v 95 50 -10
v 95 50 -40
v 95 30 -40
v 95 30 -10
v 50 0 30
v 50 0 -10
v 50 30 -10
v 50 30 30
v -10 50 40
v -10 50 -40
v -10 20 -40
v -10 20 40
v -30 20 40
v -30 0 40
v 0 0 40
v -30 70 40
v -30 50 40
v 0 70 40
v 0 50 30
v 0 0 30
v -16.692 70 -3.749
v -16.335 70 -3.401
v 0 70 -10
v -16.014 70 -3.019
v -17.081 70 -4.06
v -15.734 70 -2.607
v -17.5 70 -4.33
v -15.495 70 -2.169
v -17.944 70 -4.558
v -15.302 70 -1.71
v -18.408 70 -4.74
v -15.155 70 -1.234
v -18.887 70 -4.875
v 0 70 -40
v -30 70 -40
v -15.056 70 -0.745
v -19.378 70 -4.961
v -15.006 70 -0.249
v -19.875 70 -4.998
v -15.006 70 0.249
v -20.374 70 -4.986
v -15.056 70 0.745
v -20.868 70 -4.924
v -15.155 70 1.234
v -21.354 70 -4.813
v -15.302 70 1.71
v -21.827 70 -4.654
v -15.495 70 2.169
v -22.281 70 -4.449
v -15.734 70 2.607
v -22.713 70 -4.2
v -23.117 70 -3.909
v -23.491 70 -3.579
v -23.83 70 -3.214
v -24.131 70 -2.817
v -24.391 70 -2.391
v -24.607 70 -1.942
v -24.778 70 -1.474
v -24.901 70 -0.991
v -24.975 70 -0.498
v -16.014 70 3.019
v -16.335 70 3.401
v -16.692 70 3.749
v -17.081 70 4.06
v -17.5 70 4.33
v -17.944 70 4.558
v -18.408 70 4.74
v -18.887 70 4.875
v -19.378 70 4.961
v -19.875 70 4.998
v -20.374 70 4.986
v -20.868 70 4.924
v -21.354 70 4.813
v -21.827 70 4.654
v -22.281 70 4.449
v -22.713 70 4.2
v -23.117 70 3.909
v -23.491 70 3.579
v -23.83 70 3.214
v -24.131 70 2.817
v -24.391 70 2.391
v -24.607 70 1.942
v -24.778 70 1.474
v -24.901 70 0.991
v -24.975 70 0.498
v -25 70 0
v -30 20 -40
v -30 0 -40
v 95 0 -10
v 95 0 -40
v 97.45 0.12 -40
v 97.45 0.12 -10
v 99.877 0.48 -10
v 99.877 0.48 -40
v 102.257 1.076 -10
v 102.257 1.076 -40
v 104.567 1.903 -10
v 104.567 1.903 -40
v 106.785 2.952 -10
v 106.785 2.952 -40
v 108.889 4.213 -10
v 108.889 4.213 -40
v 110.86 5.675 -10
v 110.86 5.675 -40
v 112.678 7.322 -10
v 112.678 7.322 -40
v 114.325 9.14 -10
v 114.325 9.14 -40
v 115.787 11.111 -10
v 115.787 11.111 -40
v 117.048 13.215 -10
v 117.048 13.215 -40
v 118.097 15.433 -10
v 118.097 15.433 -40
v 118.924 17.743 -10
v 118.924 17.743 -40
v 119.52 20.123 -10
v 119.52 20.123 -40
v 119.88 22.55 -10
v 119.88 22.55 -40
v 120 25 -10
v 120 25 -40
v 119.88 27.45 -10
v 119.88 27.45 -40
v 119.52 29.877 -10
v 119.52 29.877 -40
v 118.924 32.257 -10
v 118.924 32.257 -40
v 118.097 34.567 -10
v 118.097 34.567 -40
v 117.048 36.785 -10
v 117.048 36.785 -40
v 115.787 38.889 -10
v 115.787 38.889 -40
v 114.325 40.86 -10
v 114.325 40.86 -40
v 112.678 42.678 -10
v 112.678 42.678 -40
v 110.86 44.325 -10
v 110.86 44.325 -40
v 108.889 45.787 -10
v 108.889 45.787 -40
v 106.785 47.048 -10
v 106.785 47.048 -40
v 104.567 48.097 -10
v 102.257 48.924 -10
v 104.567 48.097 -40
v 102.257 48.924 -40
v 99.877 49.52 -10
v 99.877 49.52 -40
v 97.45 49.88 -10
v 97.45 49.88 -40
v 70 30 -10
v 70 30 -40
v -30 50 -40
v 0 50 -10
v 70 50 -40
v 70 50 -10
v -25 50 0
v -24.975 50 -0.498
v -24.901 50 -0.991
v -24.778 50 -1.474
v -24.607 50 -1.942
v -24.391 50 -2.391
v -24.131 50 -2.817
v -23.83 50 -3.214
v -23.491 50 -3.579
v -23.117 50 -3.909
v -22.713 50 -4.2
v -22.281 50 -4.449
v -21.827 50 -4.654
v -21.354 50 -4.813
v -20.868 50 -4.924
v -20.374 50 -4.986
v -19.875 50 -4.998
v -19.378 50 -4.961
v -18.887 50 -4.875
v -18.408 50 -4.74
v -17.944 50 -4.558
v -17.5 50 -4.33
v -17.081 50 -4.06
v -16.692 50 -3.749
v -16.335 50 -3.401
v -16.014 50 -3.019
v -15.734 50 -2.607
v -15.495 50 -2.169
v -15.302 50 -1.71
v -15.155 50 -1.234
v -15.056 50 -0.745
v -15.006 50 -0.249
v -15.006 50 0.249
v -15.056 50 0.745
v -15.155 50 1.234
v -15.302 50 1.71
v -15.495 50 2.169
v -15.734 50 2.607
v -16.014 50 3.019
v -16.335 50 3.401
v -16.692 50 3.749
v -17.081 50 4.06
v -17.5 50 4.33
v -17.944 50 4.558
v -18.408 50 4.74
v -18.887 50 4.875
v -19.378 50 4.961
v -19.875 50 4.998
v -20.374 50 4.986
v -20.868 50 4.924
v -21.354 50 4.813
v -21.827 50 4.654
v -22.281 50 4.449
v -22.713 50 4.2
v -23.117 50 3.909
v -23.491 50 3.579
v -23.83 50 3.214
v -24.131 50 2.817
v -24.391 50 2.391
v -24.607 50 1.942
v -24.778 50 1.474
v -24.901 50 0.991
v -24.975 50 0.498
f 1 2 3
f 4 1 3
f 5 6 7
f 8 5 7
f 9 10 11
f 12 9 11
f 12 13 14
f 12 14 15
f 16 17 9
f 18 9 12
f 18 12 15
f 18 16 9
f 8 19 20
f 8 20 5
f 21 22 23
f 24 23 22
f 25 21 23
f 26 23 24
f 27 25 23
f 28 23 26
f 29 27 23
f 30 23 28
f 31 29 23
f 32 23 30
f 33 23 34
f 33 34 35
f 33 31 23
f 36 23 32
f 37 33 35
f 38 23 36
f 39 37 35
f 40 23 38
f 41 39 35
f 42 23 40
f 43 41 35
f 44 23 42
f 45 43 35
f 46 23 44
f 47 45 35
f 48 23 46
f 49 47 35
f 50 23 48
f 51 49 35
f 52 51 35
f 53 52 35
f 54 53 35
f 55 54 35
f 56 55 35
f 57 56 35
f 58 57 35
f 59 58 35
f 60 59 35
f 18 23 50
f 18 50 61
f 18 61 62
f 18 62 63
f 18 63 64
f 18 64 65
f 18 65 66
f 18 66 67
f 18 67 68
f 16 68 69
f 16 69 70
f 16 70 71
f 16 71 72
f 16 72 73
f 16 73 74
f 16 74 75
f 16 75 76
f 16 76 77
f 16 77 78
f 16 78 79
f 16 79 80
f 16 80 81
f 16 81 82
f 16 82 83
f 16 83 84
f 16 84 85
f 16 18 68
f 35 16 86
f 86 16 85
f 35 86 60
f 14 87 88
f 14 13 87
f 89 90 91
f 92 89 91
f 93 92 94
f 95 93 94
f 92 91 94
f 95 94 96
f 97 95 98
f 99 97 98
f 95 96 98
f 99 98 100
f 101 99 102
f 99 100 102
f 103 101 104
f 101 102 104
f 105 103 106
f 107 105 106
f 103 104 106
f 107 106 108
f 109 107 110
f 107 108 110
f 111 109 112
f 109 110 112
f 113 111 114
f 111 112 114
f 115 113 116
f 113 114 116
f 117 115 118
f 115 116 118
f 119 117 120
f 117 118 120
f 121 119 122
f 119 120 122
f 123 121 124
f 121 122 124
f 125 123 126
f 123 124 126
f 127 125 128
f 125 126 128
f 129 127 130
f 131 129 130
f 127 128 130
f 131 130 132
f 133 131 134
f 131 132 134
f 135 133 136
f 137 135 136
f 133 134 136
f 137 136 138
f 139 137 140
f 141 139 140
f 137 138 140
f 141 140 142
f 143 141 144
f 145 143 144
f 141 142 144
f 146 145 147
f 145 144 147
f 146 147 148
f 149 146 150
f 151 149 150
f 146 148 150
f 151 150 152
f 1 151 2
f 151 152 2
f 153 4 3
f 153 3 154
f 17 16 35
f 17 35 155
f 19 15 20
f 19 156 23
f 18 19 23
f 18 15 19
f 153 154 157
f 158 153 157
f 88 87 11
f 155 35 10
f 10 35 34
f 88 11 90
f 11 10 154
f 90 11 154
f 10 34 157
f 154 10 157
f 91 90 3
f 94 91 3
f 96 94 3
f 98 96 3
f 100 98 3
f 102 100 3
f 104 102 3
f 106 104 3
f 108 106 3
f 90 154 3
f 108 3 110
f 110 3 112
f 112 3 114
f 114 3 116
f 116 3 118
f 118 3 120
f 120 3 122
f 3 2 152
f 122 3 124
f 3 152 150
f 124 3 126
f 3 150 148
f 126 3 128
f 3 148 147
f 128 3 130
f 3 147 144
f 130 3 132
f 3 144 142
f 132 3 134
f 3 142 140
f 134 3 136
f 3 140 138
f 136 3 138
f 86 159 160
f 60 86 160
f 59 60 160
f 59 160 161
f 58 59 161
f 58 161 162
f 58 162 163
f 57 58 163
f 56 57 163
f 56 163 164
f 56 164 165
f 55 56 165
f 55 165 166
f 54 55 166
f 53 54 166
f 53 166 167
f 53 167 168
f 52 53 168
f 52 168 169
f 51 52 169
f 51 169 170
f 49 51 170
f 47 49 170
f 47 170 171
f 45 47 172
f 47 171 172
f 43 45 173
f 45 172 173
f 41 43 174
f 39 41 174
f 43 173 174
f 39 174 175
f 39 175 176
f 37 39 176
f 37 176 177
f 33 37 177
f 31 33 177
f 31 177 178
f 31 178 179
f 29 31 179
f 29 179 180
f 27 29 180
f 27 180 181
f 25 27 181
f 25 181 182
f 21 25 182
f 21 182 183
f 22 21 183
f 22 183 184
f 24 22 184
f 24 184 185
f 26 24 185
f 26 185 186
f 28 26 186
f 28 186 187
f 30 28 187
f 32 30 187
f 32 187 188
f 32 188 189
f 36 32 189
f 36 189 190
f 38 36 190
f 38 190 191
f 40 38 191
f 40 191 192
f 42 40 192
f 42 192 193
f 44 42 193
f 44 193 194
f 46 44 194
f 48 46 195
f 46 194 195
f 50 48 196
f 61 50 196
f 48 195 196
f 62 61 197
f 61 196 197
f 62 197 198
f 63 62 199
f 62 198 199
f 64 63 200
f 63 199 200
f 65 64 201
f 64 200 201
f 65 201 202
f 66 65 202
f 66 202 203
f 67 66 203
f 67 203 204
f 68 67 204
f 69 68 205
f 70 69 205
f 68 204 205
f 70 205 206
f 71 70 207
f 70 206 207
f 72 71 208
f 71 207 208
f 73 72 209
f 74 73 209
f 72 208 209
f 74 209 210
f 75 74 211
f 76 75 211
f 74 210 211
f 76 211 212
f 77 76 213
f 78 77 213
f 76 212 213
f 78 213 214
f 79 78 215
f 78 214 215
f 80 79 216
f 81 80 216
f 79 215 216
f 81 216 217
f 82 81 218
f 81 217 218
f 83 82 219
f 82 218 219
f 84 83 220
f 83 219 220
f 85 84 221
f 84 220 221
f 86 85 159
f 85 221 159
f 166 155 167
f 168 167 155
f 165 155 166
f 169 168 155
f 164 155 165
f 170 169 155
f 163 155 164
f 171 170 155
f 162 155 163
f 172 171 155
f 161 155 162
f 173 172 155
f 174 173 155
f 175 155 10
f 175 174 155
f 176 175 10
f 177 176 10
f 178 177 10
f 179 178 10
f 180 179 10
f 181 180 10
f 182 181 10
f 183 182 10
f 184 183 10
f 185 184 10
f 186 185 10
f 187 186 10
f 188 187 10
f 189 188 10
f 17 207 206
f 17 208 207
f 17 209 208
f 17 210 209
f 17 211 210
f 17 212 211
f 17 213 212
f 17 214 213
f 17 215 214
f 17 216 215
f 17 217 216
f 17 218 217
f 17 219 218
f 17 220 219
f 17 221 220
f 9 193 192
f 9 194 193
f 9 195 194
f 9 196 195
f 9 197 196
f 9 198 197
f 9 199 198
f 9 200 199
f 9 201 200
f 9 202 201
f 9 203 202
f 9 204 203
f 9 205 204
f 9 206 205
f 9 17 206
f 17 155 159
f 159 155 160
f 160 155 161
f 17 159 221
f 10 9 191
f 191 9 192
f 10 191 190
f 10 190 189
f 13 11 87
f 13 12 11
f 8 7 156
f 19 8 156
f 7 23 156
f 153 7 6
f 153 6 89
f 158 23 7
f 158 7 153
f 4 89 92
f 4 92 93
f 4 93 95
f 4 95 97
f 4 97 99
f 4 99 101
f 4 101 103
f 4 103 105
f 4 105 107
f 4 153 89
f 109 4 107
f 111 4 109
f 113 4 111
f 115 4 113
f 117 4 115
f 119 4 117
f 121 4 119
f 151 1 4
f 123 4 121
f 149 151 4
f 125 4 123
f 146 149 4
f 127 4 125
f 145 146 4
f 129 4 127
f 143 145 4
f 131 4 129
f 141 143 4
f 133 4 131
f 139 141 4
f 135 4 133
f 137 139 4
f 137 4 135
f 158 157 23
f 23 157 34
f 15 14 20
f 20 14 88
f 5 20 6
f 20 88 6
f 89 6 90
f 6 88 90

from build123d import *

# Parameters (mm, degrees)
BOSS_EXTRUDE1_DEPTH        = 40
BOSS_EXTRUDE2_START        = -40
BOSS_EXTRUDE2_DEPTH        = 30
BOSS_EXTRUDE3_DEPTH        = 40
F_10_0MM_DOWEL_HOLE1_D     = 10
F_10_0MM_DOWEL_HOLE1_DEPTH = 20


with BuildPart() as part:
    # Sketch1 → Boss-Extrude1 (new, symmetric)
    with BuildSketch(Plane.XY):
        Polygon((0, 0), (0, 70), (-30, 70), (-30, 50), (-10, 50), (-10, 20), (-30, 20), (-30, 0), align=None)
    extrude(amount=BOSS_EXTRUDE1_DEPTH, both=True)

    # Sketch1<3> → Boss-Extrude2 (add)
    with BuildSketch(Plane.XY.offset(BOSS_EXTRUDE2_START)):
        Polygon((0, 70), (-30, 70), (-30, 50), (-10, 50), (-10, 20), (-30, 20), (-30, 0), (0, 0), align=None)
        with BuildLine():
            Line((70, 50), (0, 70))
            Line((0, 70), (0, 0))
            Line((0, 0), (95, 0))
            ThreePointArc((95, 0), (120, 25), (95, 50))
            Line((95, 50), (95, 30))
            Line((95, 30), (70, 30))
            Line((70, 30), (70, 50))
        make_face()
    extrude(amount=BOSS_EXTRUDE2_DEPTH)

    # Sketch2 → Boss-Extrude3 (add)
    with BuildSketch(Plane.XY.offset(-10)):
        Polygon((0, 50), (0, 0), (50, 0), (50, 30), align=None)
    extrude(amount=BOSS_EXTRUDE3_DEPTH)

    # Ø10.0mm Dowel Hole1
    with Locations(Plane(origin=(0, 70, 0), x_dir=(1, 0, 0), z_dir=(0, 1, 0))):
        with Locations((-20, 0)):
            Hole(F_10_0MM_DOWEL_HOLE1_D / 2, depth=F_10_0MM_DOWEL_HOLE1_DEPTH)


solid = part.part
